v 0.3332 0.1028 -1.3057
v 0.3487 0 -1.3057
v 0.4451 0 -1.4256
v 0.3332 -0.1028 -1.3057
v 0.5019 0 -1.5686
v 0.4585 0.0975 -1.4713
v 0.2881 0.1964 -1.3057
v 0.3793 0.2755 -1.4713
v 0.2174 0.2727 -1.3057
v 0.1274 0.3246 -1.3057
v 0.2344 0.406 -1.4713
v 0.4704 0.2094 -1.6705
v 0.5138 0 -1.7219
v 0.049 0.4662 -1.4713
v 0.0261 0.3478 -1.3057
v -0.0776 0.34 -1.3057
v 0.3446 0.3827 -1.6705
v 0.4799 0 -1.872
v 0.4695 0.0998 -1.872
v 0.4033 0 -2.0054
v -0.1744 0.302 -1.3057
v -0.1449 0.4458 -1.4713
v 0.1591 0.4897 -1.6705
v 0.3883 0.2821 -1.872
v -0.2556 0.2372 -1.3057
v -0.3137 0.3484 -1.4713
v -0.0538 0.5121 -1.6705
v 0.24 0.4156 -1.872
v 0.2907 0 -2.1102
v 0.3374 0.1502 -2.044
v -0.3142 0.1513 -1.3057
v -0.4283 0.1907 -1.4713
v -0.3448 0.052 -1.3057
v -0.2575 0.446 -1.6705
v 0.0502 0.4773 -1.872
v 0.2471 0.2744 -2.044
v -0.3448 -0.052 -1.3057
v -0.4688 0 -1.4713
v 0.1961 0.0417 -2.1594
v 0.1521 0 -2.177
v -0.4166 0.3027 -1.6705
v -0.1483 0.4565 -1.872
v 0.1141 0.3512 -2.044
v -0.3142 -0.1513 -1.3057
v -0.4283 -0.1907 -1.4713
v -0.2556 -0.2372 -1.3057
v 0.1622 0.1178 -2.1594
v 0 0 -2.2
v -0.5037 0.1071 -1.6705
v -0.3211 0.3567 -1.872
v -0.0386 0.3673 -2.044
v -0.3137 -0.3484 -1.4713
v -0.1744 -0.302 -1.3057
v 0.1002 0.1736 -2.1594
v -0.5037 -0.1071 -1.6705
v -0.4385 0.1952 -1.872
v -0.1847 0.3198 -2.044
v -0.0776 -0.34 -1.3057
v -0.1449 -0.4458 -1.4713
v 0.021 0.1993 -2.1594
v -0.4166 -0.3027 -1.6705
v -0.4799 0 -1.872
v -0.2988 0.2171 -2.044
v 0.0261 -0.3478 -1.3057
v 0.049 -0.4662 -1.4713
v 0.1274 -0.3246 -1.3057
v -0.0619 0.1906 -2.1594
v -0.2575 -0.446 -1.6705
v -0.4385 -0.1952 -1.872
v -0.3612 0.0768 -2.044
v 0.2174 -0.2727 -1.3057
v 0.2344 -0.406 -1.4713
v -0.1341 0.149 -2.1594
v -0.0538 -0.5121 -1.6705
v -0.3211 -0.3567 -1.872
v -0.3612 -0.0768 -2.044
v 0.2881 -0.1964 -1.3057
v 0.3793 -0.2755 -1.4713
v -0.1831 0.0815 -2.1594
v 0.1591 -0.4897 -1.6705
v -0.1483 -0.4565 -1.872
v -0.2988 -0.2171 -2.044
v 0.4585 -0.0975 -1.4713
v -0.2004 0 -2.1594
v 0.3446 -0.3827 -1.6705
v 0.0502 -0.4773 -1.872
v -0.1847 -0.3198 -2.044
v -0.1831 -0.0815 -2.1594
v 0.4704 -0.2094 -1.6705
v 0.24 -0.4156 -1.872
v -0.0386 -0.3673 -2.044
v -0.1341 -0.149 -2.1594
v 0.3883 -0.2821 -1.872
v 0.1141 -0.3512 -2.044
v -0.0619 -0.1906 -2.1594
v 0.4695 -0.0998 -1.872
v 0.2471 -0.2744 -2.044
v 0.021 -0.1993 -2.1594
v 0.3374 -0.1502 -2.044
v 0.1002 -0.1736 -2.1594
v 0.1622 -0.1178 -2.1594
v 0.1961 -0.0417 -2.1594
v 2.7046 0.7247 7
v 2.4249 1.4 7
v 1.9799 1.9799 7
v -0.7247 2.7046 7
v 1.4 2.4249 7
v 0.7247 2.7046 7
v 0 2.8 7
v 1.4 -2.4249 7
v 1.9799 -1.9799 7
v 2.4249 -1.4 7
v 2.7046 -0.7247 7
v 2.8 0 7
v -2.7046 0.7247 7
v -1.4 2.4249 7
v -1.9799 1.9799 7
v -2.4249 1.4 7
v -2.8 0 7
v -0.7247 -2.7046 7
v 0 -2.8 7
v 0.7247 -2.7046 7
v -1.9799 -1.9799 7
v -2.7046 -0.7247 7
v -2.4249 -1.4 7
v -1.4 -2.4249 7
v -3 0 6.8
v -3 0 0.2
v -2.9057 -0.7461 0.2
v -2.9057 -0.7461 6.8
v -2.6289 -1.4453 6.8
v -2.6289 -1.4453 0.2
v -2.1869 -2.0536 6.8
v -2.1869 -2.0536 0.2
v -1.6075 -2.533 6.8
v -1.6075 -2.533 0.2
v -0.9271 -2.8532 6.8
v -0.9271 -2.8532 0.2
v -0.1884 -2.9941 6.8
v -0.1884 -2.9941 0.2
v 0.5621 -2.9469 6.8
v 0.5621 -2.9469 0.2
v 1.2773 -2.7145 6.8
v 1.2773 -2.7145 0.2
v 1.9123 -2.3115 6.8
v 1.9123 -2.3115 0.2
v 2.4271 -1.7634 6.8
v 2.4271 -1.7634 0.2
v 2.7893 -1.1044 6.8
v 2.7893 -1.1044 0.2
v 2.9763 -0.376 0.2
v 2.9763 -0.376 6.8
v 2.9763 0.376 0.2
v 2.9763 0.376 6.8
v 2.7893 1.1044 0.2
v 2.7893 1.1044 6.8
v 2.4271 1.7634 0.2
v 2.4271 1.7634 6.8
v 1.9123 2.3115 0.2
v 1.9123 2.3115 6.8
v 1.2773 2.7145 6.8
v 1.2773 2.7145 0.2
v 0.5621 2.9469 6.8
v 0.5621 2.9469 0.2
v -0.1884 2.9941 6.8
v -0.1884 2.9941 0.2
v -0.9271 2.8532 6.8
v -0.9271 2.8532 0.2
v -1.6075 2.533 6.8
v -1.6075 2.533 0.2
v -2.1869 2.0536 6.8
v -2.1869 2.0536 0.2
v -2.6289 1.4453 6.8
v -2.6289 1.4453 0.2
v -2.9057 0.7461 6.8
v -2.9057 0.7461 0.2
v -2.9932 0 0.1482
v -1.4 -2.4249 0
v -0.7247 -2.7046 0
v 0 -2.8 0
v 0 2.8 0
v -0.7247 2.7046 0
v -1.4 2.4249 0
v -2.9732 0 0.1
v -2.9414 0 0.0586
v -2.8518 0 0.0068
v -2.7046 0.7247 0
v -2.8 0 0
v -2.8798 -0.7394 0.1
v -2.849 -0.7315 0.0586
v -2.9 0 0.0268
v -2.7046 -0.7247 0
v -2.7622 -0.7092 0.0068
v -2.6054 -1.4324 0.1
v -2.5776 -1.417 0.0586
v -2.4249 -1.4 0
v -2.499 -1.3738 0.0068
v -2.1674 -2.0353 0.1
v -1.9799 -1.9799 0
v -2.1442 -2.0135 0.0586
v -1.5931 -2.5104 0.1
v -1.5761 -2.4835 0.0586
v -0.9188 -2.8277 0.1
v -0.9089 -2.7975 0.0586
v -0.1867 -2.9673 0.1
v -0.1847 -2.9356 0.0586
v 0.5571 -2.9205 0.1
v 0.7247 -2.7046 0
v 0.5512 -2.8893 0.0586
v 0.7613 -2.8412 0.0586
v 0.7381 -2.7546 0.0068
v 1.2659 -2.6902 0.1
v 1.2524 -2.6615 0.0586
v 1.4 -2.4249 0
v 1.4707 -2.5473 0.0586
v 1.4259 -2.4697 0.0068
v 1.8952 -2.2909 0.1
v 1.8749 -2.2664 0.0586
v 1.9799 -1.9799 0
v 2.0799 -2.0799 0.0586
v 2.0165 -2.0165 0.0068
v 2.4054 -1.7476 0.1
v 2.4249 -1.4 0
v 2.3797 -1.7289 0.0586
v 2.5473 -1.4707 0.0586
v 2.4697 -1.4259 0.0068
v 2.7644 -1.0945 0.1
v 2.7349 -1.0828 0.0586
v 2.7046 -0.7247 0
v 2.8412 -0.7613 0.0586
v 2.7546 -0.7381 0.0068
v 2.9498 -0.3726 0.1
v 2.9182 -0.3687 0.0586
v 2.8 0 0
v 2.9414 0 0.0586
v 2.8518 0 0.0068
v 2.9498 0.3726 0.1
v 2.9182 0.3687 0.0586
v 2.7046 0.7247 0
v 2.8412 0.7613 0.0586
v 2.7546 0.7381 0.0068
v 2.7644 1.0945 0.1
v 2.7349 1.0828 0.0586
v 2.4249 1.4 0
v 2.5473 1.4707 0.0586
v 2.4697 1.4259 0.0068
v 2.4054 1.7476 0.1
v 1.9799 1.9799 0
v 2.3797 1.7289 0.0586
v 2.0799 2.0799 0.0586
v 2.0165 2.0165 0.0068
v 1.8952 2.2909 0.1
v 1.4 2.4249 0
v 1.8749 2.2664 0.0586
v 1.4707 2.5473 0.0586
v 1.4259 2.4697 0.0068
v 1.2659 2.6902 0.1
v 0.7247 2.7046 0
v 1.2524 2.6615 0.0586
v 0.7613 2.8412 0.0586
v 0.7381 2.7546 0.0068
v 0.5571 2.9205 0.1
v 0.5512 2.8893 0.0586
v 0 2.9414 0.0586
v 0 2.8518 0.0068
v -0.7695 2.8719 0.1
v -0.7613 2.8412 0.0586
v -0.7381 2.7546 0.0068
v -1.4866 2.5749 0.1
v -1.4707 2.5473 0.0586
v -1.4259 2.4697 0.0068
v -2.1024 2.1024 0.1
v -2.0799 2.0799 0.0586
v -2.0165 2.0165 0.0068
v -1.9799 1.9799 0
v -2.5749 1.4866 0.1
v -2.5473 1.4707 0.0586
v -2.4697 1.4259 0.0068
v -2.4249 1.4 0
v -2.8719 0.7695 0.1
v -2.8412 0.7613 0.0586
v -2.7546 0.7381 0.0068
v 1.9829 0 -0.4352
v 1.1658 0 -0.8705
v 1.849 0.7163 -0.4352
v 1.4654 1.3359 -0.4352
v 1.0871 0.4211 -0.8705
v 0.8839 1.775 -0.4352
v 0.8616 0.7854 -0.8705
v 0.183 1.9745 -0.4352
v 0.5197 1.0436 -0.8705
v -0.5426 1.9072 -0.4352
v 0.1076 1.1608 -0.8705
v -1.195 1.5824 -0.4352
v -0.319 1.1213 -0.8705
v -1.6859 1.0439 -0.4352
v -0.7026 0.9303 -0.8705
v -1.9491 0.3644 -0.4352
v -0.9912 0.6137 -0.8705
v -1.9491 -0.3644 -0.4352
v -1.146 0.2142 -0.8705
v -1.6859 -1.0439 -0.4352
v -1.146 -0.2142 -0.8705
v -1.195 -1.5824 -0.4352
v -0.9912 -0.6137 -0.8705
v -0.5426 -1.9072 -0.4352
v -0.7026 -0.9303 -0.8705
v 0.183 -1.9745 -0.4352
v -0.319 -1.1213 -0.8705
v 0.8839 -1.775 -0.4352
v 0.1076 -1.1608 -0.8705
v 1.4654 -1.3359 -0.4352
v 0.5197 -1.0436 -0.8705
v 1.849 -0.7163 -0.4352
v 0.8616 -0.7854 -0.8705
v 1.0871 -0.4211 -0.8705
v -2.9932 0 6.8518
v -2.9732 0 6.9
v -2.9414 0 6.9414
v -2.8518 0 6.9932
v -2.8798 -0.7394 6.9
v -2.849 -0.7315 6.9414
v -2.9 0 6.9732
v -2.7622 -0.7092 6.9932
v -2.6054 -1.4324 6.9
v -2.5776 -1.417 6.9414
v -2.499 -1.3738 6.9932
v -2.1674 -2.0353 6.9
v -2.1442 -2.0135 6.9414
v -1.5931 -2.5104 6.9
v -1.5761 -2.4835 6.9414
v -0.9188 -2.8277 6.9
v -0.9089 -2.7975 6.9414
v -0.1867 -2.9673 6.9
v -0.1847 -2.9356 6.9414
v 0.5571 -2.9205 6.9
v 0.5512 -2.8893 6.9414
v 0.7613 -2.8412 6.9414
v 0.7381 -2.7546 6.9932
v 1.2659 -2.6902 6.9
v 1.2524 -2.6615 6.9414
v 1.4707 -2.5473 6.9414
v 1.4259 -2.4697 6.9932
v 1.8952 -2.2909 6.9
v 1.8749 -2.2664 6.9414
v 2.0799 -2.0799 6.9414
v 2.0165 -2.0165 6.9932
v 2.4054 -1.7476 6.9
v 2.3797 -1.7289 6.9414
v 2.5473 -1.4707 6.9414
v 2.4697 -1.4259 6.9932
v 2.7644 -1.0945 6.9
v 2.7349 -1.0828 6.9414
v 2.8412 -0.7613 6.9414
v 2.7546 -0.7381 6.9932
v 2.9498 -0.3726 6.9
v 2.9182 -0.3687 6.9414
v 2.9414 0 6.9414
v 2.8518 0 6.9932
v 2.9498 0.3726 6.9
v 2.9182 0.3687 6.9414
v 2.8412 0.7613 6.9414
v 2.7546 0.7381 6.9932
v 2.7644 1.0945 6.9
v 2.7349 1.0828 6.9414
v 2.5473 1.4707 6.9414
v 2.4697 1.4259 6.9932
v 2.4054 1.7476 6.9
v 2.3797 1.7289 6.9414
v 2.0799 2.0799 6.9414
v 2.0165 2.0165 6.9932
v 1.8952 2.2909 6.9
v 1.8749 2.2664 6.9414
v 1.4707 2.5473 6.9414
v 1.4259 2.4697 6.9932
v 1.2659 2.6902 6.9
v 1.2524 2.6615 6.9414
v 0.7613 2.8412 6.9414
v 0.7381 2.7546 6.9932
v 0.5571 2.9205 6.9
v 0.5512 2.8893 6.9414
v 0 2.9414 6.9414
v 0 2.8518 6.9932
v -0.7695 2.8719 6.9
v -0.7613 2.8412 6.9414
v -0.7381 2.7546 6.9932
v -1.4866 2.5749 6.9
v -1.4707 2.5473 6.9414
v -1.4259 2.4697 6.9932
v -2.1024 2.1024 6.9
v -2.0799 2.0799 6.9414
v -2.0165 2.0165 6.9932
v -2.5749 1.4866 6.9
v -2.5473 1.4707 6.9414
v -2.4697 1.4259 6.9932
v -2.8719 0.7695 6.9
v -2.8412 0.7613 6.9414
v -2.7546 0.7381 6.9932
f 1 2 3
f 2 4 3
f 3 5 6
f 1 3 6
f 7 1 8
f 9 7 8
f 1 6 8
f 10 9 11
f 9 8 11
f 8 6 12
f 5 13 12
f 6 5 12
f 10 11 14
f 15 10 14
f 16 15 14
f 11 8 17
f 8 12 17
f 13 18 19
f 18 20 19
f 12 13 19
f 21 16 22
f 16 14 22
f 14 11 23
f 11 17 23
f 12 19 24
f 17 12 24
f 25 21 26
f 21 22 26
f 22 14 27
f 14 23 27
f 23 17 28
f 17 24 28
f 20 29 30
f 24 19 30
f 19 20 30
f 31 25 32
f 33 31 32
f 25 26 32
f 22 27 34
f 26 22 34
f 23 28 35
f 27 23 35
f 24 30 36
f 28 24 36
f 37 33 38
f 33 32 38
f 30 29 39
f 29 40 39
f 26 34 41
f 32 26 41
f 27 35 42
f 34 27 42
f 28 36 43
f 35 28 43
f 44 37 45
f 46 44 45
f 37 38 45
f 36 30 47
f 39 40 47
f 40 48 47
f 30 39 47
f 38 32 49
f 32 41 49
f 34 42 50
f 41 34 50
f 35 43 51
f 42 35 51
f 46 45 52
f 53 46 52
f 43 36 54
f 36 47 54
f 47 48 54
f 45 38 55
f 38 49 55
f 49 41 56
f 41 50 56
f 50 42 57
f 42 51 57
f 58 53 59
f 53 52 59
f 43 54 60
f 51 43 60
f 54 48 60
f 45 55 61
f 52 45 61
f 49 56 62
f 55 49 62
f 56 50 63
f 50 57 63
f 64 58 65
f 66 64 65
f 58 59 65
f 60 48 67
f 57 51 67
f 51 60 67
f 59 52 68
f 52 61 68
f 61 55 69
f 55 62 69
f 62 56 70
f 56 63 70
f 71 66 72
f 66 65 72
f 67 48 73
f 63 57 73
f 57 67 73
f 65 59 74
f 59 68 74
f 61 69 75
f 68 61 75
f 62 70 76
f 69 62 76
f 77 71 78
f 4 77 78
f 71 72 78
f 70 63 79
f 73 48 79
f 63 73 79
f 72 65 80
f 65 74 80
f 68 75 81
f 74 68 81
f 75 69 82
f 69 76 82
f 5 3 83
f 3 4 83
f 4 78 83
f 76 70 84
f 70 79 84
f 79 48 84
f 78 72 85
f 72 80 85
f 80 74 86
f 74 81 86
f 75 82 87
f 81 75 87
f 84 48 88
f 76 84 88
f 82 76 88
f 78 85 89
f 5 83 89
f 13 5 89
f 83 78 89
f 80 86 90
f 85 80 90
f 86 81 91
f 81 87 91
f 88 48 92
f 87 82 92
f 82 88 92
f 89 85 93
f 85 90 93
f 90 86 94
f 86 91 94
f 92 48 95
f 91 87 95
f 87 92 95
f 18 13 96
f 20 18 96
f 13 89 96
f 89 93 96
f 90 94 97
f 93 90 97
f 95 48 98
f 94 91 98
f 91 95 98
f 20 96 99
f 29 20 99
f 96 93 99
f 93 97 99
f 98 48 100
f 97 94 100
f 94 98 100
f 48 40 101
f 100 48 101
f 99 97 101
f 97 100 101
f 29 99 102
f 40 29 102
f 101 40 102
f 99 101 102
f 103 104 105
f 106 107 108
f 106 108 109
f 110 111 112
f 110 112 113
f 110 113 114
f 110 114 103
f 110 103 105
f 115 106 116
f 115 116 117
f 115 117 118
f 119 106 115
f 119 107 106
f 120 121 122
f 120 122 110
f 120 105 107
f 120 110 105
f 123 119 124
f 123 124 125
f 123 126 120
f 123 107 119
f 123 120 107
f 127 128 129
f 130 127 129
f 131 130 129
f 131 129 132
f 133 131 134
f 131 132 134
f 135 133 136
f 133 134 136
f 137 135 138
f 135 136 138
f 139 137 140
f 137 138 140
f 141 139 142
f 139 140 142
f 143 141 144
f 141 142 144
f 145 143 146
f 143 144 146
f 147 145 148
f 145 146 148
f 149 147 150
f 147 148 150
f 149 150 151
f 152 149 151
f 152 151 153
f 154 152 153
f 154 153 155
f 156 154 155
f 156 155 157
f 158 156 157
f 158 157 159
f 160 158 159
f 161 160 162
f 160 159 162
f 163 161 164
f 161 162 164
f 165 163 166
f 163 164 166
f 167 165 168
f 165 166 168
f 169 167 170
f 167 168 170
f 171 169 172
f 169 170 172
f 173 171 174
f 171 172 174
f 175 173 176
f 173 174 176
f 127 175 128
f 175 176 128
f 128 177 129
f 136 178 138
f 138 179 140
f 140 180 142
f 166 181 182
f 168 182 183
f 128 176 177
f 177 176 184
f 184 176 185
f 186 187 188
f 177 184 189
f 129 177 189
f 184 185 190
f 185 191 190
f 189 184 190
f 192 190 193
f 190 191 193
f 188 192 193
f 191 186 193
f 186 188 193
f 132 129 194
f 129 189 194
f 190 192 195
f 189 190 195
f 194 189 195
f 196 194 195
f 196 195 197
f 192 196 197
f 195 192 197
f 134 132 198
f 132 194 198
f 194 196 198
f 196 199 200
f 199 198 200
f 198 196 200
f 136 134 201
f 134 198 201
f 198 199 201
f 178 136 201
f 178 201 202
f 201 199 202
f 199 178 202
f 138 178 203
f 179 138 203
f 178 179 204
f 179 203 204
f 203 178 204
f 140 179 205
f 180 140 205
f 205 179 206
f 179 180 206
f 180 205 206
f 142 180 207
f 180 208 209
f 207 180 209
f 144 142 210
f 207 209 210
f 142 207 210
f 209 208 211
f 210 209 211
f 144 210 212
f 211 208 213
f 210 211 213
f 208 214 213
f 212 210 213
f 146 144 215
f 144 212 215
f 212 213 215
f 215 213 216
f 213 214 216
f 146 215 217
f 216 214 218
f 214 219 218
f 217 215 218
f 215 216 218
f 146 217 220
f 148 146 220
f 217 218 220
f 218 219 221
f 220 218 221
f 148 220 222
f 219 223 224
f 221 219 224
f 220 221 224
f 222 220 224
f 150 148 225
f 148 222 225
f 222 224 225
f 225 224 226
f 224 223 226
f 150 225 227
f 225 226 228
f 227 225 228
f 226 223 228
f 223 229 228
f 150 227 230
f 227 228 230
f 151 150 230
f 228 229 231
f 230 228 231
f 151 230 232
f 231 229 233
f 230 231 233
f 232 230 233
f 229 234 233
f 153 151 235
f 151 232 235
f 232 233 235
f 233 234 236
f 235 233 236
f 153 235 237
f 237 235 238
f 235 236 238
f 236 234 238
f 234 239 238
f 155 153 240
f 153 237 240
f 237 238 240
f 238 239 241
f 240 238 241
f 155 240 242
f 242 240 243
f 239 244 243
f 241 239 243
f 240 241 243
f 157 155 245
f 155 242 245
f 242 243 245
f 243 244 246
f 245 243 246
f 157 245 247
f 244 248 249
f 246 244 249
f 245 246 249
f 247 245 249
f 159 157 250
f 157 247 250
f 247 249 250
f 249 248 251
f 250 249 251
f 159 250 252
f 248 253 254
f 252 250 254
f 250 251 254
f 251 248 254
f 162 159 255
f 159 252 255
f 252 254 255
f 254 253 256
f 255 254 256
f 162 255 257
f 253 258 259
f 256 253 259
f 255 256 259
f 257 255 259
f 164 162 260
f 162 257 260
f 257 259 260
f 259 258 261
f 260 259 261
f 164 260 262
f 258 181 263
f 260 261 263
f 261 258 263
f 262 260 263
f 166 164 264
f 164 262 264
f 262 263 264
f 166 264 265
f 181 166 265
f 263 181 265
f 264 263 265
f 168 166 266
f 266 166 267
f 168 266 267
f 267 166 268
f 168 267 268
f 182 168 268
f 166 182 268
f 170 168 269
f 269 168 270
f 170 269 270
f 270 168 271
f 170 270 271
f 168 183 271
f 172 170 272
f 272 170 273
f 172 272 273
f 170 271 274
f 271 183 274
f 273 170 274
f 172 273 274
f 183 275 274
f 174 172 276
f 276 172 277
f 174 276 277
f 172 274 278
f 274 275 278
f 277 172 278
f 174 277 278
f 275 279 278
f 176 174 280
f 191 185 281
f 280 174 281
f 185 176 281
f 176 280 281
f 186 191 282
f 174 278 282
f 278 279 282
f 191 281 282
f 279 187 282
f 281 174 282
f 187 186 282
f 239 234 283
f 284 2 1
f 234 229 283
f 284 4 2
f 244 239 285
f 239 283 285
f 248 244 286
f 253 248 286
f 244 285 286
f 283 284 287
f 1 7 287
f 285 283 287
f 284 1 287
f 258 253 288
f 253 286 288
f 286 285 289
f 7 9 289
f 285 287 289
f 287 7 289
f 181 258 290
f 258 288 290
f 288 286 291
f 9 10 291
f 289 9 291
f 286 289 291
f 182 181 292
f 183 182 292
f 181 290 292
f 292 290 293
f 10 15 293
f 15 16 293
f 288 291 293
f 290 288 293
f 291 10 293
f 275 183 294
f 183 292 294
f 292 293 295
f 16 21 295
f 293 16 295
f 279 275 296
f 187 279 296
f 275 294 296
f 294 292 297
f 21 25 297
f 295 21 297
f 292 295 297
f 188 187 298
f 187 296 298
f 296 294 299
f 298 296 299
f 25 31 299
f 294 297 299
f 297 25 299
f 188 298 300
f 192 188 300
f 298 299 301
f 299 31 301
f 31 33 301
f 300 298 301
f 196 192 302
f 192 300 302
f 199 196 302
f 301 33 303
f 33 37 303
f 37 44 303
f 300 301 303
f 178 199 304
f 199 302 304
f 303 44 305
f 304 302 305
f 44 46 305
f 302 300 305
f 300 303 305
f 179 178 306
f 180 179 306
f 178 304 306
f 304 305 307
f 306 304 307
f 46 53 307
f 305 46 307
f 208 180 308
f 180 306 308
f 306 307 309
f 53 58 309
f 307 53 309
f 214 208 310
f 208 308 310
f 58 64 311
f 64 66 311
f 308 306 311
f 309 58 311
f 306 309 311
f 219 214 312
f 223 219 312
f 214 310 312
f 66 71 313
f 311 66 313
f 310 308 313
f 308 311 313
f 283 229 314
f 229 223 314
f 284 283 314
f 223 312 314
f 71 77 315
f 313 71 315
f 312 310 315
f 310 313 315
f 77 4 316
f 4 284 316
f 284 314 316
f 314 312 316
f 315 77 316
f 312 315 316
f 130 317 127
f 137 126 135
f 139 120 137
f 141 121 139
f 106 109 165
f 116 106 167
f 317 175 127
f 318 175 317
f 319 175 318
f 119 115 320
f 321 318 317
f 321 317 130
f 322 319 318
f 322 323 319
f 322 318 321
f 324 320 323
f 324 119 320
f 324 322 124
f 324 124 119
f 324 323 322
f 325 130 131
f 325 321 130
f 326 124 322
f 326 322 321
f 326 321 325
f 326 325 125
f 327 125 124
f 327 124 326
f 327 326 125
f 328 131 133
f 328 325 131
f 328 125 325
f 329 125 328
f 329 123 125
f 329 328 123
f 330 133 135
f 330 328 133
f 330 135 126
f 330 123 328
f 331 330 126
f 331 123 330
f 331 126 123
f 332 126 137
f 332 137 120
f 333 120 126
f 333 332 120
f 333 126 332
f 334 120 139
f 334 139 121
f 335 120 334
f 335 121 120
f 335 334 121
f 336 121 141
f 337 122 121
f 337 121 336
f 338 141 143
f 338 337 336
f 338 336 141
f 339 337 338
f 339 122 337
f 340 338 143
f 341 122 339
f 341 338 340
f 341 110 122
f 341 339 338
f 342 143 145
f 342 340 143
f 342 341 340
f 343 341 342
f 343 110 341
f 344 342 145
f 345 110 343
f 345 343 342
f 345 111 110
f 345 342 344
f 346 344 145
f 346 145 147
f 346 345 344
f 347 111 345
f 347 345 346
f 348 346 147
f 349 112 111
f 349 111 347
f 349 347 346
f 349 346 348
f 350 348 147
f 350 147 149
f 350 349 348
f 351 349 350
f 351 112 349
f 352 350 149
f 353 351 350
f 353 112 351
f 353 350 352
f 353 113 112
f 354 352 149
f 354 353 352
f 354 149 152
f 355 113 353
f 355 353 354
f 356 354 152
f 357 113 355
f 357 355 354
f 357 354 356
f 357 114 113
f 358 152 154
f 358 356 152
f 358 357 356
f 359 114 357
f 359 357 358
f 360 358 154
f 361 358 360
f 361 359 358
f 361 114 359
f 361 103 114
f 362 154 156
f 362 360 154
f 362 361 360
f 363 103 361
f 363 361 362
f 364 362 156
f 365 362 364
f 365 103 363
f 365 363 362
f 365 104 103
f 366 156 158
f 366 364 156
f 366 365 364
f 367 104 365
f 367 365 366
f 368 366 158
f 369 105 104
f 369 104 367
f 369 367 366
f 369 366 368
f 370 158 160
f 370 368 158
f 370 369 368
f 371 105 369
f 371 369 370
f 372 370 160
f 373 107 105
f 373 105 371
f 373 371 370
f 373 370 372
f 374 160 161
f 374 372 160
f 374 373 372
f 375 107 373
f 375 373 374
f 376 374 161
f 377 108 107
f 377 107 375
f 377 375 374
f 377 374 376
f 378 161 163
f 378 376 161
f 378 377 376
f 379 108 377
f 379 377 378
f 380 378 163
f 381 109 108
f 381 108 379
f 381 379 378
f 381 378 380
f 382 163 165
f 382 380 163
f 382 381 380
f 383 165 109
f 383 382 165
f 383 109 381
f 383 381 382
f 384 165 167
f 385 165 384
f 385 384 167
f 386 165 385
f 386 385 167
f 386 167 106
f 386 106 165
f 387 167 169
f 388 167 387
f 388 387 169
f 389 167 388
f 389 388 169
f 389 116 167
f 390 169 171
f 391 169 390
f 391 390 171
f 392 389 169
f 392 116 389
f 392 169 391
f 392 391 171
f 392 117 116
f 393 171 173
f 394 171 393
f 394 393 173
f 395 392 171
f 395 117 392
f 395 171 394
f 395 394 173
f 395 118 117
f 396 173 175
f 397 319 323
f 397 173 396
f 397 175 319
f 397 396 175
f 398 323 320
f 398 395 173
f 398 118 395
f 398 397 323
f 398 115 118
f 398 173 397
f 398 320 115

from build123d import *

# Parameters (mm, degrees)
SKETCH1_R           = 3
BOSS_EXTRUDE1_DEPTH = 7
FILLET2_R           = 0.2
FILLET3_R           = 0.2


with BuildPart() as part:
    # Sketch1 → Boss-Extrude1 (new body)
    with BuildSketch(Plane.XY):
        with Locations(Location((0, 0, 0), (0, 0, 180))):
            Circle(SKETCH1_R)
    extrude(amount=BOSS_EXTRUDE1_DEPTH)

    # Fillet2
    fillet2_edges = [part.edges().sort_by_distance(p)[0] for p in [
        (3, 0, 7),
    ]]
    fillet(fillet2_edges, radius=FILLET2_R)

    # Fillet3
    fillet3_edges = [part.edges().sort_by_distance(p)[0] for p in [
        (3, 0, 0),
    ]]
    fillet(fillet3_edges, radius=FILLET3_R)

    # Sketch4 → Revolve1 (revolve)
    with BuildSketch(Plane(origin=(0, 0, 0), x_dir=(1, 0, 0), z_dir=(0, 1, 0))):
        with BuildLine():
            Line((0, 0), (2.8, 0))
            Line((2.8, 0), (0.348733134, 1.30569363))
            ThreePointArc((0.348733134, 1.30569363), (0.479948636, 1.872008824), (0, 2.200002288))
            Line((0, 2.200002288), (0, 0))
        make_face()
    revolve(axis=Axis((0, 0, -5.421968799), (0, 0, 1)))


solid = part.part
